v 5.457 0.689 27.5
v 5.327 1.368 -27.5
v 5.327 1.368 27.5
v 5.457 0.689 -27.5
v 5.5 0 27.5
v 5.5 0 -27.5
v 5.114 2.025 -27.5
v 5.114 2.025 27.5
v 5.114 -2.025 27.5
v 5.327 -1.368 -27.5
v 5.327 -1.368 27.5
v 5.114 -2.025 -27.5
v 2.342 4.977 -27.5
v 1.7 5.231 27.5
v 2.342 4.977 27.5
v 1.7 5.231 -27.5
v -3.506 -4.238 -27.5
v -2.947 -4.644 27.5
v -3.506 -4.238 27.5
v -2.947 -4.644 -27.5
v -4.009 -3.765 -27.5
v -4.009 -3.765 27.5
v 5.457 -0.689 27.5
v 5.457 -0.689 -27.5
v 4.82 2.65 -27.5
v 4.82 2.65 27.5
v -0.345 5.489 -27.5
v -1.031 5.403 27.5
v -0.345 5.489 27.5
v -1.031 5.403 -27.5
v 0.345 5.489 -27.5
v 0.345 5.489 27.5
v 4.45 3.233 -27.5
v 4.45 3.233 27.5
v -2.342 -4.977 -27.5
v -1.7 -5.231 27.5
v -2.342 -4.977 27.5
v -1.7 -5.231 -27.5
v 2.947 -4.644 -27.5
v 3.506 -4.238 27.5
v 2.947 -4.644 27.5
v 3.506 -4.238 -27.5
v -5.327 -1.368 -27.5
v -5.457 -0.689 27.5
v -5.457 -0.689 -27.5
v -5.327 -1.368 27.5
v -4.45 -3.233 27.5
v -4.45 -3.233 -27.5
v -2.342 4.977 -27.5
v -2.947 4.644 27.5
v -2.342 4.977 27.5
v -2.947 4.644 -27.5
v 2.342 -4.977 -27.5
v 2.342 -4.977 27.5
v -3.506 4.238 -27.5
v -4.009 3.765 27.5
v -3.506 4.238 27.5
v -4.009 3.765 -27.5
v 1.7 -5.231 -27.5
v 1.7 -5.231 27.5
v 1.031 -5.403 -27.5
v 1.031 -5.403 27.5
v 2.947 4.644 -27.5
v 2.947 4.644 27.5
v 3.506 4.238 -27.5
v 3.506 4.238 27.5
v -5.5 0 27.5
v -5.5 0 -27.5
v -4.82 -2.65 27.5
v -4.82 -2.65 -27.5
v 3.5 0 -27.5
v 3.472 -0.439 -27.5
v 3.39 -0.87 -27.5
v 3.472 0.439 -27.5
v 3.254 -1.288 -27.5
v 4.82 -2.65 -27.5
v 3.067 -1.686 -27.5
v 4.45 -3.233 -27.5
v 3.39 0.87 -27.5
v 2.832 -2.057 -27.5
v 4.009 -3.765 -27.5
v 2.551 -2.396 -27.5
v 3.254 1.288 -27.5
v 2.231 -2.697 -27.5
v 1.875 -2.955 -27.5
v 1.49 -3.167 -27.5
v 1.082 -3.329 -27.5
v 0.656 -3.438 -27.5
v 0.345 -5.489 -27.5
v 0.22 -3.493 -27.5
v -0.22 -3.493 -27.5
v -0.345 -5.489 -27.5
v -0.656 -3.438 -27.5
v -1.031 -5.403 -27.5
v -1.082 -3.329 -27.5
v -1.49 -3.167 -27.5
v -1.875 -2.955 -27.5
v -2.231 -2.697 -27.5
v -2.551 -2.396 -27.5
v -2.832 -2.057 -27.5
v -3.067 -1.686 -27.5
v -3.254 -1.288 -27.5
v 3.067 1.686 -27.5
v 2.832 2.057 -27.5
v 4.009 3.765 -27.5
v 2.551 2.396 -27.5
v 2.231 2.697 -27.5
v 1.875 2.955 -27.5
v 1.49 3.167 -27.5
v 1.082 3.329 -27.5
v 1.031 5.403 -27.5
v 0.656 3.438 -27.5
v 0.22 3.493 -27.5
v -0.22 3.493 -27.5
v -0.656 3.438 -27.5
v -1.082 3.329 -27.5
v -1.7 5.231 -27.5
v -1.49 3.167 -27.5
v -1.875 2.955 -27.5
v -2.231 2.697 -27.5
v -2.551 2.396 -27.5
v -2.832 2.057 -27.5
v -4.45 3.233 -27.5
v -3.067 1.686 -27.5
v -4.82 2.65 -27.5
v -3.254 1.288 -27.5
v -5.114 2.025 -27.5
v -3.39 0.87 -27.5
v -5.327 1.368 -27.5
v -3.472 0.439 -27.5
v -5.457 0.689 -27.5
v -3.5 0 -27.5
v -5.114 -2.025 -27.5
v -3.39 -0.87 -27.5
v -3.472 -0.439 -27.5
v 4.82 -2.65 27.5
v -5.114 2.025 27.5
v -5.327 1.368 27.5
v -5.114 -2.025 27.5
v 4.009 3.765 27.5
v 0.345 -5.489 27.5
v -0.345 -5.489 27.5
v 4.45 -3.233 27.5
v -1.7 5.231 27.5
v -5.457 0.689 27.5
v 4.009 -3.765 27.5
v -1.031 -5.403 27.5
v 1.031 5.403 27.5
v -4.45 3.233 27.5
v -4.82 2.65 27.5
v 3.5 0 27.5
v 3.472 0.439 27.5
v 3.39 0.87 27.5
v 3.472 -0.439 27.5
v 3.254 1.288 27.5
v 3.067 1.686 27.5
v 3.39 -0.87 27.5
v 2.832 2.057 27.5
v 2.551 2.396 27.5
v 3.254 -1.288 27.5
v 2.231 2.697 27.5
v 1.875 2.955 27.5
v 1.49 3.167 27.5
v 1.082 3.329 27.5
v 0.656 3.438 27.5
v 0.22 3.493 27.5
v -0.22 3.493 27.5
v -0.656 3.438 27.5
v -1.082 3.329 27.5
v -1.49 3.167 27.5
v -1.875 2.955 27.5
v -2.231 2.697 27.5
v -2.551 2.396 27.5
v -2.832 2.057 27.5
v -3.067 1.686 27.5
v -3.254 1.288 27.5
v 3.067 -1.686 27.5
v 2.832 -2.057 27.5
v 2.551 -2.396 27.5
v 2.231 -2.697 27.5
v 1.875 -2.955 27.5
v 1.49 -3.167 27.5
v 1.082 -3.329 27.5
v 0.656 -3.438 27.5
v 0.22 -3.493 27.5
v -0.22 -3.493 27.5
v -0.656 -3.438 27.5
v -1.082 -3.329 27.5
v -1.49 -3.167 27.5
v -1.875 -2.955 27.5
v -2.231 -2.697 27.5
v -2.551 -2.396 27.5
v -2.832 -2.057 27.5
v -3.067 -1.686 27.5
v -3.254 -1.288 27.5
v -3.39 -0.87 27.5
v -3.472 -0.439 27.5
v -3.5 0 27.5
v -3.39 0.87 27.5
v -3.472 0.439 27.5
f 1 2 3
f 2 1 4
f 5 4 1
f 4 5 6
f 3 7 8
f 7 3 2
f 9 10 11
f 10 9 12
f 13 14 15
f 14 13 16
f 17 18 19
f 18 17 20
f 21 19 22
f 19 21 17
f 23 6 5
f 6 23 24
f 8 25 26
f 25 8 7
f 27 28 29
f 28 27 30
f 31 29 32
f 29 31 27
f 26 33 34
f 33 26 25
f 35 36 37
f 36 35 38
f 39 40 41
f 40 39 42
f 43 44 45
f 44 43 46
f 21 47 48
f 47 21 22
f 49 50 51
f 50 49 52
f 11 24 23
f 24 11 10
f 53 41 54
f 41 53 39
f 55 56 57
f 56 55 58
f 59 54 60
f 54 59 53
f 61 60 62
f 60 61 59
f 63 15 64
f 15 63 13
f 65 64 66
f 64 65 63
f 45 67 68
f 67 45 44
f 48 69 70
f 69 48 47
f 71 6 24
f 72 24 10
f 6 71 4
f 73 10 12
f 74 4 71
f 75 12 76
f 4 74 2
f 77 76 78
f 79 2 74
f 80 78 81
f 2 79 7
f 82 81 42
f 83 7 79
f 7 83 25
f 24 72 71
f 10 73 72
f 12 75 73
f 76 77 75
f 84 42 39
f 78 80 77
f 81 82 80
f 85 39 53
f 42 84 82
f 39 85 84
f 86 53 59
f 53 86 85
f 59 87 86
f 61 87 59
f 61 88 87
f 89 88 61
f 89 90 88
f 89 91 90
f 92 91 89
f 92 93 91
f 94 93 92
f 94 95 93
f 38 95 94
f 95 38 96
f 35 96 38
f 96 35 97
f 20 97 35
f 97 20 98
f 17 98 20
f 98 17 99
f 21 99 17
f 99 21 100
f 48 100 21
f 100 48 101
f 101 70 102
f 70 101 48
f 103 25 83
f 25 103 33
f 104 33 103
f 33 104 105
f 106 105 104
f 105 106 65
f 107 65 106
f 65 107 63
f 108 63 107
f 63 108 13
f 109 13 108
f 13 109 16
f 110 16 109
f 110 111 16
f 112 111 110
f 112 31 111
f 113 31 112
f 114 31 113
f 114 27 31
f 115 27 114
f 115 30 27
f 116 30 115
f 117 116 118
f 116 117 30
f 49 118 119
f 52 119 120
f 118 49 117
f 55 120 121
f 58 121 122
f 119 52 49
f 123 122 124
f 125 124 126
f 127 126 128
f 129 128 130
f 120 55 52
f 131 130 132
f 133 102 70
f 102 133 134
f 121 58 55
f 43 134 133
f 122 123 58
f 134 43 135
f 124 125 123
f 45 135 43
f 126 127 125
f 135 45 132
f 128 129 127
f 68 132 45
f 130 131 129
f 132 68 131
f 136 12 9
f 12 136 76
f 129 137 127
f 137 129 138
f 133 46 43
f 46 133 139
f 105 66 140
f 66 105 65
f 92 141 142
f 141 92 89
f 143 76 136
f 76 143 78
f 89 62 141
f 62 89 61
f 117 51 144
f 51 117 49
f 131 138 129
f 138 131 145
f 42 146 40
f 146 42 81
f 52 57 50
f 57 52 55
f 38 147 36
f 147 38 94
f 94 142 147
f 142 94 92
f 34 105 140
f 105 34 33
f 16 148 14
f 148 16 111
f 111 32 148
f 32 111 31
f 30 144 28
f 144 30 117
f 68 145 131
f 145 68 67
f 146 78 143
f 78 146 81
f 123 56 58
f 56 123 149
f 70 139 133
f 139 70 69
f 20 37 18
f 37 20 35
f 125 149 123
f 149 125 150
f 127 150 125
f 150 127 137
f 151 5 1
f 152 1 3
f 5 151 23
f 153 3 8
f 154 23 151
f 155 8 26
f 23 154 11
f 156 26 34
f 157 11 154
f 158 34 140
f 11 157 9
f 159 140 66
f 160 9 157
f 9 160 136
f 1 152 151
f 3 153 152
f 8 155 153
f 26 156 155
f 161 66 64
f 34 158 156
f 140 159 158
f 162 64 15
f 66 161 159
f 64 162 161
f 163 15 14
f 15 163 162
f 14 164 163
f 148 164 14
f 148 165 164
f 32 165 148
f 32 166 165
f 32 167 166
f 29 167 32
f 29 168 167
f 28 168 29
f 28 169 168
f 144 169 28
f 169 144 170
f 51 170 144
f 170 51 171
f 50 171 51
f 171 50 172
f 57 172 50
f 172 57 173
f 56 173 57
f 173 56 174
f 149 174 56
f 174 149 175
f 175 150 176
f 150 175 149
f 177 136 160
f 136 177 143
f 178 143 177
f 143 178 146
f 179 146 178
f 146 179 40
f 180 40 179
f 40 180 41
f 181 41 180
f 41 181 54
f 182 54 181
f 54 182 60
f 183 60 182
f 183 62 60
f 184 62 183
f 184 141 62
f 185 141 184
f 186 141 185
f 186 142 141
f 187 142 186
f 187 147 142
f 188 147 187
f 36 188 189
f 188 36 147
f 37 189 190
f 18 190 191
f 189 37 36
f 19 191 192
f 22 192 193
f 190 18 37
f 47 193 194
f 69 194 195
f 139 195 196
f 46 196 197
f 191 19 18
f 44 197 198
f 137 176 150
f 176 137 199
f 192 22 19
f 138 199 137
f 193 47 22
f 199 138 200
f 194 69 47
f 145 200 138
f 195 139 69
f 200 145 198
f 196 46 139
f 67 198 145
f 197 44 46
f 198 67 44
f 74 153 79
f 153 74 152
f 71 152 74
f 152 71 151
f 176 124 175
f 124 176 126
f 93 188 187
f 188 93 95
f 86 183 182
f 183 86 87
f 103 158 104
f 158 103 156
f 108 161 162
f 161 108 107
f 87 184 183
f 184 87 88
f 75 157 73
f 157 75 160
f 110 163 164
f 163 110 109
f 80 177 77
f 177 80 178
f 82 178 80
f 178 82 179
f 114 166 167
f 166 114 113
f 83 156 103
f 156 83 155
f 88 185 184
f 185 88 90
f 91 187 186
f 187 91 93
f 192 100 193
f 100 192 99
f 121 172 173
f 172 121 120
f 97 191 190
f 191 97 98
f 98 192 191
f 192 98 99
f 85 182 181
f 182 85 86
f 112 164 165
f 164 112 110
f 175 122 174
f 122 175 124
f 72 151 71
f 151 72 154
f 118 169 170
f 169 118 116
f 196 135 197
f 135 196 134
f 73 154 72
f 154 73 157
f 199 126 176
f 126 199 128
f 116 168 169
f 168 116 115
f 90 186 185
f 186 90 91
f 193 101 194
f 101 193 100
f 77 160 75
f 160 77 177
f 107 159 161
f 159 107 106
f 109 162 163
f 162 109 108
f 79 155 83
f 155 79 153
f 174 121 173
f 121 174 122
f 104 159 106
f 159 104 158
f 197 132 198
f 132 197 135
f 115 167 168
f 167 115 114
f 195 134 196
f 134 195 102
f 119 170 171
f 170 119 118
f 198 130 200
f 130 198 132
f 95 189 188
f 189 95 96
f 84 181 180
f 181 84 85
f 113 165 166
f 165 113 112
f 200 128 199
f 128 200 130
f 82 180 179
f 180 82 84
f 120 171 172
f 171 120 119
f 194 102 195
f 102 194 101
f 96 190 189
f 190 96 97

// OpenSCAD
$fn = 50;


difference() {
	union() {
		translate(v = [0, 0, -27.5000000000]) {
			cylinder(h = 55, r = 5.5000000000);
		}
	}
	union() {
		translate(v = [0, 0, -100.0000000000]) {
			cylinder(h = 200, r = 3.5000000000);
		}
	}
}
